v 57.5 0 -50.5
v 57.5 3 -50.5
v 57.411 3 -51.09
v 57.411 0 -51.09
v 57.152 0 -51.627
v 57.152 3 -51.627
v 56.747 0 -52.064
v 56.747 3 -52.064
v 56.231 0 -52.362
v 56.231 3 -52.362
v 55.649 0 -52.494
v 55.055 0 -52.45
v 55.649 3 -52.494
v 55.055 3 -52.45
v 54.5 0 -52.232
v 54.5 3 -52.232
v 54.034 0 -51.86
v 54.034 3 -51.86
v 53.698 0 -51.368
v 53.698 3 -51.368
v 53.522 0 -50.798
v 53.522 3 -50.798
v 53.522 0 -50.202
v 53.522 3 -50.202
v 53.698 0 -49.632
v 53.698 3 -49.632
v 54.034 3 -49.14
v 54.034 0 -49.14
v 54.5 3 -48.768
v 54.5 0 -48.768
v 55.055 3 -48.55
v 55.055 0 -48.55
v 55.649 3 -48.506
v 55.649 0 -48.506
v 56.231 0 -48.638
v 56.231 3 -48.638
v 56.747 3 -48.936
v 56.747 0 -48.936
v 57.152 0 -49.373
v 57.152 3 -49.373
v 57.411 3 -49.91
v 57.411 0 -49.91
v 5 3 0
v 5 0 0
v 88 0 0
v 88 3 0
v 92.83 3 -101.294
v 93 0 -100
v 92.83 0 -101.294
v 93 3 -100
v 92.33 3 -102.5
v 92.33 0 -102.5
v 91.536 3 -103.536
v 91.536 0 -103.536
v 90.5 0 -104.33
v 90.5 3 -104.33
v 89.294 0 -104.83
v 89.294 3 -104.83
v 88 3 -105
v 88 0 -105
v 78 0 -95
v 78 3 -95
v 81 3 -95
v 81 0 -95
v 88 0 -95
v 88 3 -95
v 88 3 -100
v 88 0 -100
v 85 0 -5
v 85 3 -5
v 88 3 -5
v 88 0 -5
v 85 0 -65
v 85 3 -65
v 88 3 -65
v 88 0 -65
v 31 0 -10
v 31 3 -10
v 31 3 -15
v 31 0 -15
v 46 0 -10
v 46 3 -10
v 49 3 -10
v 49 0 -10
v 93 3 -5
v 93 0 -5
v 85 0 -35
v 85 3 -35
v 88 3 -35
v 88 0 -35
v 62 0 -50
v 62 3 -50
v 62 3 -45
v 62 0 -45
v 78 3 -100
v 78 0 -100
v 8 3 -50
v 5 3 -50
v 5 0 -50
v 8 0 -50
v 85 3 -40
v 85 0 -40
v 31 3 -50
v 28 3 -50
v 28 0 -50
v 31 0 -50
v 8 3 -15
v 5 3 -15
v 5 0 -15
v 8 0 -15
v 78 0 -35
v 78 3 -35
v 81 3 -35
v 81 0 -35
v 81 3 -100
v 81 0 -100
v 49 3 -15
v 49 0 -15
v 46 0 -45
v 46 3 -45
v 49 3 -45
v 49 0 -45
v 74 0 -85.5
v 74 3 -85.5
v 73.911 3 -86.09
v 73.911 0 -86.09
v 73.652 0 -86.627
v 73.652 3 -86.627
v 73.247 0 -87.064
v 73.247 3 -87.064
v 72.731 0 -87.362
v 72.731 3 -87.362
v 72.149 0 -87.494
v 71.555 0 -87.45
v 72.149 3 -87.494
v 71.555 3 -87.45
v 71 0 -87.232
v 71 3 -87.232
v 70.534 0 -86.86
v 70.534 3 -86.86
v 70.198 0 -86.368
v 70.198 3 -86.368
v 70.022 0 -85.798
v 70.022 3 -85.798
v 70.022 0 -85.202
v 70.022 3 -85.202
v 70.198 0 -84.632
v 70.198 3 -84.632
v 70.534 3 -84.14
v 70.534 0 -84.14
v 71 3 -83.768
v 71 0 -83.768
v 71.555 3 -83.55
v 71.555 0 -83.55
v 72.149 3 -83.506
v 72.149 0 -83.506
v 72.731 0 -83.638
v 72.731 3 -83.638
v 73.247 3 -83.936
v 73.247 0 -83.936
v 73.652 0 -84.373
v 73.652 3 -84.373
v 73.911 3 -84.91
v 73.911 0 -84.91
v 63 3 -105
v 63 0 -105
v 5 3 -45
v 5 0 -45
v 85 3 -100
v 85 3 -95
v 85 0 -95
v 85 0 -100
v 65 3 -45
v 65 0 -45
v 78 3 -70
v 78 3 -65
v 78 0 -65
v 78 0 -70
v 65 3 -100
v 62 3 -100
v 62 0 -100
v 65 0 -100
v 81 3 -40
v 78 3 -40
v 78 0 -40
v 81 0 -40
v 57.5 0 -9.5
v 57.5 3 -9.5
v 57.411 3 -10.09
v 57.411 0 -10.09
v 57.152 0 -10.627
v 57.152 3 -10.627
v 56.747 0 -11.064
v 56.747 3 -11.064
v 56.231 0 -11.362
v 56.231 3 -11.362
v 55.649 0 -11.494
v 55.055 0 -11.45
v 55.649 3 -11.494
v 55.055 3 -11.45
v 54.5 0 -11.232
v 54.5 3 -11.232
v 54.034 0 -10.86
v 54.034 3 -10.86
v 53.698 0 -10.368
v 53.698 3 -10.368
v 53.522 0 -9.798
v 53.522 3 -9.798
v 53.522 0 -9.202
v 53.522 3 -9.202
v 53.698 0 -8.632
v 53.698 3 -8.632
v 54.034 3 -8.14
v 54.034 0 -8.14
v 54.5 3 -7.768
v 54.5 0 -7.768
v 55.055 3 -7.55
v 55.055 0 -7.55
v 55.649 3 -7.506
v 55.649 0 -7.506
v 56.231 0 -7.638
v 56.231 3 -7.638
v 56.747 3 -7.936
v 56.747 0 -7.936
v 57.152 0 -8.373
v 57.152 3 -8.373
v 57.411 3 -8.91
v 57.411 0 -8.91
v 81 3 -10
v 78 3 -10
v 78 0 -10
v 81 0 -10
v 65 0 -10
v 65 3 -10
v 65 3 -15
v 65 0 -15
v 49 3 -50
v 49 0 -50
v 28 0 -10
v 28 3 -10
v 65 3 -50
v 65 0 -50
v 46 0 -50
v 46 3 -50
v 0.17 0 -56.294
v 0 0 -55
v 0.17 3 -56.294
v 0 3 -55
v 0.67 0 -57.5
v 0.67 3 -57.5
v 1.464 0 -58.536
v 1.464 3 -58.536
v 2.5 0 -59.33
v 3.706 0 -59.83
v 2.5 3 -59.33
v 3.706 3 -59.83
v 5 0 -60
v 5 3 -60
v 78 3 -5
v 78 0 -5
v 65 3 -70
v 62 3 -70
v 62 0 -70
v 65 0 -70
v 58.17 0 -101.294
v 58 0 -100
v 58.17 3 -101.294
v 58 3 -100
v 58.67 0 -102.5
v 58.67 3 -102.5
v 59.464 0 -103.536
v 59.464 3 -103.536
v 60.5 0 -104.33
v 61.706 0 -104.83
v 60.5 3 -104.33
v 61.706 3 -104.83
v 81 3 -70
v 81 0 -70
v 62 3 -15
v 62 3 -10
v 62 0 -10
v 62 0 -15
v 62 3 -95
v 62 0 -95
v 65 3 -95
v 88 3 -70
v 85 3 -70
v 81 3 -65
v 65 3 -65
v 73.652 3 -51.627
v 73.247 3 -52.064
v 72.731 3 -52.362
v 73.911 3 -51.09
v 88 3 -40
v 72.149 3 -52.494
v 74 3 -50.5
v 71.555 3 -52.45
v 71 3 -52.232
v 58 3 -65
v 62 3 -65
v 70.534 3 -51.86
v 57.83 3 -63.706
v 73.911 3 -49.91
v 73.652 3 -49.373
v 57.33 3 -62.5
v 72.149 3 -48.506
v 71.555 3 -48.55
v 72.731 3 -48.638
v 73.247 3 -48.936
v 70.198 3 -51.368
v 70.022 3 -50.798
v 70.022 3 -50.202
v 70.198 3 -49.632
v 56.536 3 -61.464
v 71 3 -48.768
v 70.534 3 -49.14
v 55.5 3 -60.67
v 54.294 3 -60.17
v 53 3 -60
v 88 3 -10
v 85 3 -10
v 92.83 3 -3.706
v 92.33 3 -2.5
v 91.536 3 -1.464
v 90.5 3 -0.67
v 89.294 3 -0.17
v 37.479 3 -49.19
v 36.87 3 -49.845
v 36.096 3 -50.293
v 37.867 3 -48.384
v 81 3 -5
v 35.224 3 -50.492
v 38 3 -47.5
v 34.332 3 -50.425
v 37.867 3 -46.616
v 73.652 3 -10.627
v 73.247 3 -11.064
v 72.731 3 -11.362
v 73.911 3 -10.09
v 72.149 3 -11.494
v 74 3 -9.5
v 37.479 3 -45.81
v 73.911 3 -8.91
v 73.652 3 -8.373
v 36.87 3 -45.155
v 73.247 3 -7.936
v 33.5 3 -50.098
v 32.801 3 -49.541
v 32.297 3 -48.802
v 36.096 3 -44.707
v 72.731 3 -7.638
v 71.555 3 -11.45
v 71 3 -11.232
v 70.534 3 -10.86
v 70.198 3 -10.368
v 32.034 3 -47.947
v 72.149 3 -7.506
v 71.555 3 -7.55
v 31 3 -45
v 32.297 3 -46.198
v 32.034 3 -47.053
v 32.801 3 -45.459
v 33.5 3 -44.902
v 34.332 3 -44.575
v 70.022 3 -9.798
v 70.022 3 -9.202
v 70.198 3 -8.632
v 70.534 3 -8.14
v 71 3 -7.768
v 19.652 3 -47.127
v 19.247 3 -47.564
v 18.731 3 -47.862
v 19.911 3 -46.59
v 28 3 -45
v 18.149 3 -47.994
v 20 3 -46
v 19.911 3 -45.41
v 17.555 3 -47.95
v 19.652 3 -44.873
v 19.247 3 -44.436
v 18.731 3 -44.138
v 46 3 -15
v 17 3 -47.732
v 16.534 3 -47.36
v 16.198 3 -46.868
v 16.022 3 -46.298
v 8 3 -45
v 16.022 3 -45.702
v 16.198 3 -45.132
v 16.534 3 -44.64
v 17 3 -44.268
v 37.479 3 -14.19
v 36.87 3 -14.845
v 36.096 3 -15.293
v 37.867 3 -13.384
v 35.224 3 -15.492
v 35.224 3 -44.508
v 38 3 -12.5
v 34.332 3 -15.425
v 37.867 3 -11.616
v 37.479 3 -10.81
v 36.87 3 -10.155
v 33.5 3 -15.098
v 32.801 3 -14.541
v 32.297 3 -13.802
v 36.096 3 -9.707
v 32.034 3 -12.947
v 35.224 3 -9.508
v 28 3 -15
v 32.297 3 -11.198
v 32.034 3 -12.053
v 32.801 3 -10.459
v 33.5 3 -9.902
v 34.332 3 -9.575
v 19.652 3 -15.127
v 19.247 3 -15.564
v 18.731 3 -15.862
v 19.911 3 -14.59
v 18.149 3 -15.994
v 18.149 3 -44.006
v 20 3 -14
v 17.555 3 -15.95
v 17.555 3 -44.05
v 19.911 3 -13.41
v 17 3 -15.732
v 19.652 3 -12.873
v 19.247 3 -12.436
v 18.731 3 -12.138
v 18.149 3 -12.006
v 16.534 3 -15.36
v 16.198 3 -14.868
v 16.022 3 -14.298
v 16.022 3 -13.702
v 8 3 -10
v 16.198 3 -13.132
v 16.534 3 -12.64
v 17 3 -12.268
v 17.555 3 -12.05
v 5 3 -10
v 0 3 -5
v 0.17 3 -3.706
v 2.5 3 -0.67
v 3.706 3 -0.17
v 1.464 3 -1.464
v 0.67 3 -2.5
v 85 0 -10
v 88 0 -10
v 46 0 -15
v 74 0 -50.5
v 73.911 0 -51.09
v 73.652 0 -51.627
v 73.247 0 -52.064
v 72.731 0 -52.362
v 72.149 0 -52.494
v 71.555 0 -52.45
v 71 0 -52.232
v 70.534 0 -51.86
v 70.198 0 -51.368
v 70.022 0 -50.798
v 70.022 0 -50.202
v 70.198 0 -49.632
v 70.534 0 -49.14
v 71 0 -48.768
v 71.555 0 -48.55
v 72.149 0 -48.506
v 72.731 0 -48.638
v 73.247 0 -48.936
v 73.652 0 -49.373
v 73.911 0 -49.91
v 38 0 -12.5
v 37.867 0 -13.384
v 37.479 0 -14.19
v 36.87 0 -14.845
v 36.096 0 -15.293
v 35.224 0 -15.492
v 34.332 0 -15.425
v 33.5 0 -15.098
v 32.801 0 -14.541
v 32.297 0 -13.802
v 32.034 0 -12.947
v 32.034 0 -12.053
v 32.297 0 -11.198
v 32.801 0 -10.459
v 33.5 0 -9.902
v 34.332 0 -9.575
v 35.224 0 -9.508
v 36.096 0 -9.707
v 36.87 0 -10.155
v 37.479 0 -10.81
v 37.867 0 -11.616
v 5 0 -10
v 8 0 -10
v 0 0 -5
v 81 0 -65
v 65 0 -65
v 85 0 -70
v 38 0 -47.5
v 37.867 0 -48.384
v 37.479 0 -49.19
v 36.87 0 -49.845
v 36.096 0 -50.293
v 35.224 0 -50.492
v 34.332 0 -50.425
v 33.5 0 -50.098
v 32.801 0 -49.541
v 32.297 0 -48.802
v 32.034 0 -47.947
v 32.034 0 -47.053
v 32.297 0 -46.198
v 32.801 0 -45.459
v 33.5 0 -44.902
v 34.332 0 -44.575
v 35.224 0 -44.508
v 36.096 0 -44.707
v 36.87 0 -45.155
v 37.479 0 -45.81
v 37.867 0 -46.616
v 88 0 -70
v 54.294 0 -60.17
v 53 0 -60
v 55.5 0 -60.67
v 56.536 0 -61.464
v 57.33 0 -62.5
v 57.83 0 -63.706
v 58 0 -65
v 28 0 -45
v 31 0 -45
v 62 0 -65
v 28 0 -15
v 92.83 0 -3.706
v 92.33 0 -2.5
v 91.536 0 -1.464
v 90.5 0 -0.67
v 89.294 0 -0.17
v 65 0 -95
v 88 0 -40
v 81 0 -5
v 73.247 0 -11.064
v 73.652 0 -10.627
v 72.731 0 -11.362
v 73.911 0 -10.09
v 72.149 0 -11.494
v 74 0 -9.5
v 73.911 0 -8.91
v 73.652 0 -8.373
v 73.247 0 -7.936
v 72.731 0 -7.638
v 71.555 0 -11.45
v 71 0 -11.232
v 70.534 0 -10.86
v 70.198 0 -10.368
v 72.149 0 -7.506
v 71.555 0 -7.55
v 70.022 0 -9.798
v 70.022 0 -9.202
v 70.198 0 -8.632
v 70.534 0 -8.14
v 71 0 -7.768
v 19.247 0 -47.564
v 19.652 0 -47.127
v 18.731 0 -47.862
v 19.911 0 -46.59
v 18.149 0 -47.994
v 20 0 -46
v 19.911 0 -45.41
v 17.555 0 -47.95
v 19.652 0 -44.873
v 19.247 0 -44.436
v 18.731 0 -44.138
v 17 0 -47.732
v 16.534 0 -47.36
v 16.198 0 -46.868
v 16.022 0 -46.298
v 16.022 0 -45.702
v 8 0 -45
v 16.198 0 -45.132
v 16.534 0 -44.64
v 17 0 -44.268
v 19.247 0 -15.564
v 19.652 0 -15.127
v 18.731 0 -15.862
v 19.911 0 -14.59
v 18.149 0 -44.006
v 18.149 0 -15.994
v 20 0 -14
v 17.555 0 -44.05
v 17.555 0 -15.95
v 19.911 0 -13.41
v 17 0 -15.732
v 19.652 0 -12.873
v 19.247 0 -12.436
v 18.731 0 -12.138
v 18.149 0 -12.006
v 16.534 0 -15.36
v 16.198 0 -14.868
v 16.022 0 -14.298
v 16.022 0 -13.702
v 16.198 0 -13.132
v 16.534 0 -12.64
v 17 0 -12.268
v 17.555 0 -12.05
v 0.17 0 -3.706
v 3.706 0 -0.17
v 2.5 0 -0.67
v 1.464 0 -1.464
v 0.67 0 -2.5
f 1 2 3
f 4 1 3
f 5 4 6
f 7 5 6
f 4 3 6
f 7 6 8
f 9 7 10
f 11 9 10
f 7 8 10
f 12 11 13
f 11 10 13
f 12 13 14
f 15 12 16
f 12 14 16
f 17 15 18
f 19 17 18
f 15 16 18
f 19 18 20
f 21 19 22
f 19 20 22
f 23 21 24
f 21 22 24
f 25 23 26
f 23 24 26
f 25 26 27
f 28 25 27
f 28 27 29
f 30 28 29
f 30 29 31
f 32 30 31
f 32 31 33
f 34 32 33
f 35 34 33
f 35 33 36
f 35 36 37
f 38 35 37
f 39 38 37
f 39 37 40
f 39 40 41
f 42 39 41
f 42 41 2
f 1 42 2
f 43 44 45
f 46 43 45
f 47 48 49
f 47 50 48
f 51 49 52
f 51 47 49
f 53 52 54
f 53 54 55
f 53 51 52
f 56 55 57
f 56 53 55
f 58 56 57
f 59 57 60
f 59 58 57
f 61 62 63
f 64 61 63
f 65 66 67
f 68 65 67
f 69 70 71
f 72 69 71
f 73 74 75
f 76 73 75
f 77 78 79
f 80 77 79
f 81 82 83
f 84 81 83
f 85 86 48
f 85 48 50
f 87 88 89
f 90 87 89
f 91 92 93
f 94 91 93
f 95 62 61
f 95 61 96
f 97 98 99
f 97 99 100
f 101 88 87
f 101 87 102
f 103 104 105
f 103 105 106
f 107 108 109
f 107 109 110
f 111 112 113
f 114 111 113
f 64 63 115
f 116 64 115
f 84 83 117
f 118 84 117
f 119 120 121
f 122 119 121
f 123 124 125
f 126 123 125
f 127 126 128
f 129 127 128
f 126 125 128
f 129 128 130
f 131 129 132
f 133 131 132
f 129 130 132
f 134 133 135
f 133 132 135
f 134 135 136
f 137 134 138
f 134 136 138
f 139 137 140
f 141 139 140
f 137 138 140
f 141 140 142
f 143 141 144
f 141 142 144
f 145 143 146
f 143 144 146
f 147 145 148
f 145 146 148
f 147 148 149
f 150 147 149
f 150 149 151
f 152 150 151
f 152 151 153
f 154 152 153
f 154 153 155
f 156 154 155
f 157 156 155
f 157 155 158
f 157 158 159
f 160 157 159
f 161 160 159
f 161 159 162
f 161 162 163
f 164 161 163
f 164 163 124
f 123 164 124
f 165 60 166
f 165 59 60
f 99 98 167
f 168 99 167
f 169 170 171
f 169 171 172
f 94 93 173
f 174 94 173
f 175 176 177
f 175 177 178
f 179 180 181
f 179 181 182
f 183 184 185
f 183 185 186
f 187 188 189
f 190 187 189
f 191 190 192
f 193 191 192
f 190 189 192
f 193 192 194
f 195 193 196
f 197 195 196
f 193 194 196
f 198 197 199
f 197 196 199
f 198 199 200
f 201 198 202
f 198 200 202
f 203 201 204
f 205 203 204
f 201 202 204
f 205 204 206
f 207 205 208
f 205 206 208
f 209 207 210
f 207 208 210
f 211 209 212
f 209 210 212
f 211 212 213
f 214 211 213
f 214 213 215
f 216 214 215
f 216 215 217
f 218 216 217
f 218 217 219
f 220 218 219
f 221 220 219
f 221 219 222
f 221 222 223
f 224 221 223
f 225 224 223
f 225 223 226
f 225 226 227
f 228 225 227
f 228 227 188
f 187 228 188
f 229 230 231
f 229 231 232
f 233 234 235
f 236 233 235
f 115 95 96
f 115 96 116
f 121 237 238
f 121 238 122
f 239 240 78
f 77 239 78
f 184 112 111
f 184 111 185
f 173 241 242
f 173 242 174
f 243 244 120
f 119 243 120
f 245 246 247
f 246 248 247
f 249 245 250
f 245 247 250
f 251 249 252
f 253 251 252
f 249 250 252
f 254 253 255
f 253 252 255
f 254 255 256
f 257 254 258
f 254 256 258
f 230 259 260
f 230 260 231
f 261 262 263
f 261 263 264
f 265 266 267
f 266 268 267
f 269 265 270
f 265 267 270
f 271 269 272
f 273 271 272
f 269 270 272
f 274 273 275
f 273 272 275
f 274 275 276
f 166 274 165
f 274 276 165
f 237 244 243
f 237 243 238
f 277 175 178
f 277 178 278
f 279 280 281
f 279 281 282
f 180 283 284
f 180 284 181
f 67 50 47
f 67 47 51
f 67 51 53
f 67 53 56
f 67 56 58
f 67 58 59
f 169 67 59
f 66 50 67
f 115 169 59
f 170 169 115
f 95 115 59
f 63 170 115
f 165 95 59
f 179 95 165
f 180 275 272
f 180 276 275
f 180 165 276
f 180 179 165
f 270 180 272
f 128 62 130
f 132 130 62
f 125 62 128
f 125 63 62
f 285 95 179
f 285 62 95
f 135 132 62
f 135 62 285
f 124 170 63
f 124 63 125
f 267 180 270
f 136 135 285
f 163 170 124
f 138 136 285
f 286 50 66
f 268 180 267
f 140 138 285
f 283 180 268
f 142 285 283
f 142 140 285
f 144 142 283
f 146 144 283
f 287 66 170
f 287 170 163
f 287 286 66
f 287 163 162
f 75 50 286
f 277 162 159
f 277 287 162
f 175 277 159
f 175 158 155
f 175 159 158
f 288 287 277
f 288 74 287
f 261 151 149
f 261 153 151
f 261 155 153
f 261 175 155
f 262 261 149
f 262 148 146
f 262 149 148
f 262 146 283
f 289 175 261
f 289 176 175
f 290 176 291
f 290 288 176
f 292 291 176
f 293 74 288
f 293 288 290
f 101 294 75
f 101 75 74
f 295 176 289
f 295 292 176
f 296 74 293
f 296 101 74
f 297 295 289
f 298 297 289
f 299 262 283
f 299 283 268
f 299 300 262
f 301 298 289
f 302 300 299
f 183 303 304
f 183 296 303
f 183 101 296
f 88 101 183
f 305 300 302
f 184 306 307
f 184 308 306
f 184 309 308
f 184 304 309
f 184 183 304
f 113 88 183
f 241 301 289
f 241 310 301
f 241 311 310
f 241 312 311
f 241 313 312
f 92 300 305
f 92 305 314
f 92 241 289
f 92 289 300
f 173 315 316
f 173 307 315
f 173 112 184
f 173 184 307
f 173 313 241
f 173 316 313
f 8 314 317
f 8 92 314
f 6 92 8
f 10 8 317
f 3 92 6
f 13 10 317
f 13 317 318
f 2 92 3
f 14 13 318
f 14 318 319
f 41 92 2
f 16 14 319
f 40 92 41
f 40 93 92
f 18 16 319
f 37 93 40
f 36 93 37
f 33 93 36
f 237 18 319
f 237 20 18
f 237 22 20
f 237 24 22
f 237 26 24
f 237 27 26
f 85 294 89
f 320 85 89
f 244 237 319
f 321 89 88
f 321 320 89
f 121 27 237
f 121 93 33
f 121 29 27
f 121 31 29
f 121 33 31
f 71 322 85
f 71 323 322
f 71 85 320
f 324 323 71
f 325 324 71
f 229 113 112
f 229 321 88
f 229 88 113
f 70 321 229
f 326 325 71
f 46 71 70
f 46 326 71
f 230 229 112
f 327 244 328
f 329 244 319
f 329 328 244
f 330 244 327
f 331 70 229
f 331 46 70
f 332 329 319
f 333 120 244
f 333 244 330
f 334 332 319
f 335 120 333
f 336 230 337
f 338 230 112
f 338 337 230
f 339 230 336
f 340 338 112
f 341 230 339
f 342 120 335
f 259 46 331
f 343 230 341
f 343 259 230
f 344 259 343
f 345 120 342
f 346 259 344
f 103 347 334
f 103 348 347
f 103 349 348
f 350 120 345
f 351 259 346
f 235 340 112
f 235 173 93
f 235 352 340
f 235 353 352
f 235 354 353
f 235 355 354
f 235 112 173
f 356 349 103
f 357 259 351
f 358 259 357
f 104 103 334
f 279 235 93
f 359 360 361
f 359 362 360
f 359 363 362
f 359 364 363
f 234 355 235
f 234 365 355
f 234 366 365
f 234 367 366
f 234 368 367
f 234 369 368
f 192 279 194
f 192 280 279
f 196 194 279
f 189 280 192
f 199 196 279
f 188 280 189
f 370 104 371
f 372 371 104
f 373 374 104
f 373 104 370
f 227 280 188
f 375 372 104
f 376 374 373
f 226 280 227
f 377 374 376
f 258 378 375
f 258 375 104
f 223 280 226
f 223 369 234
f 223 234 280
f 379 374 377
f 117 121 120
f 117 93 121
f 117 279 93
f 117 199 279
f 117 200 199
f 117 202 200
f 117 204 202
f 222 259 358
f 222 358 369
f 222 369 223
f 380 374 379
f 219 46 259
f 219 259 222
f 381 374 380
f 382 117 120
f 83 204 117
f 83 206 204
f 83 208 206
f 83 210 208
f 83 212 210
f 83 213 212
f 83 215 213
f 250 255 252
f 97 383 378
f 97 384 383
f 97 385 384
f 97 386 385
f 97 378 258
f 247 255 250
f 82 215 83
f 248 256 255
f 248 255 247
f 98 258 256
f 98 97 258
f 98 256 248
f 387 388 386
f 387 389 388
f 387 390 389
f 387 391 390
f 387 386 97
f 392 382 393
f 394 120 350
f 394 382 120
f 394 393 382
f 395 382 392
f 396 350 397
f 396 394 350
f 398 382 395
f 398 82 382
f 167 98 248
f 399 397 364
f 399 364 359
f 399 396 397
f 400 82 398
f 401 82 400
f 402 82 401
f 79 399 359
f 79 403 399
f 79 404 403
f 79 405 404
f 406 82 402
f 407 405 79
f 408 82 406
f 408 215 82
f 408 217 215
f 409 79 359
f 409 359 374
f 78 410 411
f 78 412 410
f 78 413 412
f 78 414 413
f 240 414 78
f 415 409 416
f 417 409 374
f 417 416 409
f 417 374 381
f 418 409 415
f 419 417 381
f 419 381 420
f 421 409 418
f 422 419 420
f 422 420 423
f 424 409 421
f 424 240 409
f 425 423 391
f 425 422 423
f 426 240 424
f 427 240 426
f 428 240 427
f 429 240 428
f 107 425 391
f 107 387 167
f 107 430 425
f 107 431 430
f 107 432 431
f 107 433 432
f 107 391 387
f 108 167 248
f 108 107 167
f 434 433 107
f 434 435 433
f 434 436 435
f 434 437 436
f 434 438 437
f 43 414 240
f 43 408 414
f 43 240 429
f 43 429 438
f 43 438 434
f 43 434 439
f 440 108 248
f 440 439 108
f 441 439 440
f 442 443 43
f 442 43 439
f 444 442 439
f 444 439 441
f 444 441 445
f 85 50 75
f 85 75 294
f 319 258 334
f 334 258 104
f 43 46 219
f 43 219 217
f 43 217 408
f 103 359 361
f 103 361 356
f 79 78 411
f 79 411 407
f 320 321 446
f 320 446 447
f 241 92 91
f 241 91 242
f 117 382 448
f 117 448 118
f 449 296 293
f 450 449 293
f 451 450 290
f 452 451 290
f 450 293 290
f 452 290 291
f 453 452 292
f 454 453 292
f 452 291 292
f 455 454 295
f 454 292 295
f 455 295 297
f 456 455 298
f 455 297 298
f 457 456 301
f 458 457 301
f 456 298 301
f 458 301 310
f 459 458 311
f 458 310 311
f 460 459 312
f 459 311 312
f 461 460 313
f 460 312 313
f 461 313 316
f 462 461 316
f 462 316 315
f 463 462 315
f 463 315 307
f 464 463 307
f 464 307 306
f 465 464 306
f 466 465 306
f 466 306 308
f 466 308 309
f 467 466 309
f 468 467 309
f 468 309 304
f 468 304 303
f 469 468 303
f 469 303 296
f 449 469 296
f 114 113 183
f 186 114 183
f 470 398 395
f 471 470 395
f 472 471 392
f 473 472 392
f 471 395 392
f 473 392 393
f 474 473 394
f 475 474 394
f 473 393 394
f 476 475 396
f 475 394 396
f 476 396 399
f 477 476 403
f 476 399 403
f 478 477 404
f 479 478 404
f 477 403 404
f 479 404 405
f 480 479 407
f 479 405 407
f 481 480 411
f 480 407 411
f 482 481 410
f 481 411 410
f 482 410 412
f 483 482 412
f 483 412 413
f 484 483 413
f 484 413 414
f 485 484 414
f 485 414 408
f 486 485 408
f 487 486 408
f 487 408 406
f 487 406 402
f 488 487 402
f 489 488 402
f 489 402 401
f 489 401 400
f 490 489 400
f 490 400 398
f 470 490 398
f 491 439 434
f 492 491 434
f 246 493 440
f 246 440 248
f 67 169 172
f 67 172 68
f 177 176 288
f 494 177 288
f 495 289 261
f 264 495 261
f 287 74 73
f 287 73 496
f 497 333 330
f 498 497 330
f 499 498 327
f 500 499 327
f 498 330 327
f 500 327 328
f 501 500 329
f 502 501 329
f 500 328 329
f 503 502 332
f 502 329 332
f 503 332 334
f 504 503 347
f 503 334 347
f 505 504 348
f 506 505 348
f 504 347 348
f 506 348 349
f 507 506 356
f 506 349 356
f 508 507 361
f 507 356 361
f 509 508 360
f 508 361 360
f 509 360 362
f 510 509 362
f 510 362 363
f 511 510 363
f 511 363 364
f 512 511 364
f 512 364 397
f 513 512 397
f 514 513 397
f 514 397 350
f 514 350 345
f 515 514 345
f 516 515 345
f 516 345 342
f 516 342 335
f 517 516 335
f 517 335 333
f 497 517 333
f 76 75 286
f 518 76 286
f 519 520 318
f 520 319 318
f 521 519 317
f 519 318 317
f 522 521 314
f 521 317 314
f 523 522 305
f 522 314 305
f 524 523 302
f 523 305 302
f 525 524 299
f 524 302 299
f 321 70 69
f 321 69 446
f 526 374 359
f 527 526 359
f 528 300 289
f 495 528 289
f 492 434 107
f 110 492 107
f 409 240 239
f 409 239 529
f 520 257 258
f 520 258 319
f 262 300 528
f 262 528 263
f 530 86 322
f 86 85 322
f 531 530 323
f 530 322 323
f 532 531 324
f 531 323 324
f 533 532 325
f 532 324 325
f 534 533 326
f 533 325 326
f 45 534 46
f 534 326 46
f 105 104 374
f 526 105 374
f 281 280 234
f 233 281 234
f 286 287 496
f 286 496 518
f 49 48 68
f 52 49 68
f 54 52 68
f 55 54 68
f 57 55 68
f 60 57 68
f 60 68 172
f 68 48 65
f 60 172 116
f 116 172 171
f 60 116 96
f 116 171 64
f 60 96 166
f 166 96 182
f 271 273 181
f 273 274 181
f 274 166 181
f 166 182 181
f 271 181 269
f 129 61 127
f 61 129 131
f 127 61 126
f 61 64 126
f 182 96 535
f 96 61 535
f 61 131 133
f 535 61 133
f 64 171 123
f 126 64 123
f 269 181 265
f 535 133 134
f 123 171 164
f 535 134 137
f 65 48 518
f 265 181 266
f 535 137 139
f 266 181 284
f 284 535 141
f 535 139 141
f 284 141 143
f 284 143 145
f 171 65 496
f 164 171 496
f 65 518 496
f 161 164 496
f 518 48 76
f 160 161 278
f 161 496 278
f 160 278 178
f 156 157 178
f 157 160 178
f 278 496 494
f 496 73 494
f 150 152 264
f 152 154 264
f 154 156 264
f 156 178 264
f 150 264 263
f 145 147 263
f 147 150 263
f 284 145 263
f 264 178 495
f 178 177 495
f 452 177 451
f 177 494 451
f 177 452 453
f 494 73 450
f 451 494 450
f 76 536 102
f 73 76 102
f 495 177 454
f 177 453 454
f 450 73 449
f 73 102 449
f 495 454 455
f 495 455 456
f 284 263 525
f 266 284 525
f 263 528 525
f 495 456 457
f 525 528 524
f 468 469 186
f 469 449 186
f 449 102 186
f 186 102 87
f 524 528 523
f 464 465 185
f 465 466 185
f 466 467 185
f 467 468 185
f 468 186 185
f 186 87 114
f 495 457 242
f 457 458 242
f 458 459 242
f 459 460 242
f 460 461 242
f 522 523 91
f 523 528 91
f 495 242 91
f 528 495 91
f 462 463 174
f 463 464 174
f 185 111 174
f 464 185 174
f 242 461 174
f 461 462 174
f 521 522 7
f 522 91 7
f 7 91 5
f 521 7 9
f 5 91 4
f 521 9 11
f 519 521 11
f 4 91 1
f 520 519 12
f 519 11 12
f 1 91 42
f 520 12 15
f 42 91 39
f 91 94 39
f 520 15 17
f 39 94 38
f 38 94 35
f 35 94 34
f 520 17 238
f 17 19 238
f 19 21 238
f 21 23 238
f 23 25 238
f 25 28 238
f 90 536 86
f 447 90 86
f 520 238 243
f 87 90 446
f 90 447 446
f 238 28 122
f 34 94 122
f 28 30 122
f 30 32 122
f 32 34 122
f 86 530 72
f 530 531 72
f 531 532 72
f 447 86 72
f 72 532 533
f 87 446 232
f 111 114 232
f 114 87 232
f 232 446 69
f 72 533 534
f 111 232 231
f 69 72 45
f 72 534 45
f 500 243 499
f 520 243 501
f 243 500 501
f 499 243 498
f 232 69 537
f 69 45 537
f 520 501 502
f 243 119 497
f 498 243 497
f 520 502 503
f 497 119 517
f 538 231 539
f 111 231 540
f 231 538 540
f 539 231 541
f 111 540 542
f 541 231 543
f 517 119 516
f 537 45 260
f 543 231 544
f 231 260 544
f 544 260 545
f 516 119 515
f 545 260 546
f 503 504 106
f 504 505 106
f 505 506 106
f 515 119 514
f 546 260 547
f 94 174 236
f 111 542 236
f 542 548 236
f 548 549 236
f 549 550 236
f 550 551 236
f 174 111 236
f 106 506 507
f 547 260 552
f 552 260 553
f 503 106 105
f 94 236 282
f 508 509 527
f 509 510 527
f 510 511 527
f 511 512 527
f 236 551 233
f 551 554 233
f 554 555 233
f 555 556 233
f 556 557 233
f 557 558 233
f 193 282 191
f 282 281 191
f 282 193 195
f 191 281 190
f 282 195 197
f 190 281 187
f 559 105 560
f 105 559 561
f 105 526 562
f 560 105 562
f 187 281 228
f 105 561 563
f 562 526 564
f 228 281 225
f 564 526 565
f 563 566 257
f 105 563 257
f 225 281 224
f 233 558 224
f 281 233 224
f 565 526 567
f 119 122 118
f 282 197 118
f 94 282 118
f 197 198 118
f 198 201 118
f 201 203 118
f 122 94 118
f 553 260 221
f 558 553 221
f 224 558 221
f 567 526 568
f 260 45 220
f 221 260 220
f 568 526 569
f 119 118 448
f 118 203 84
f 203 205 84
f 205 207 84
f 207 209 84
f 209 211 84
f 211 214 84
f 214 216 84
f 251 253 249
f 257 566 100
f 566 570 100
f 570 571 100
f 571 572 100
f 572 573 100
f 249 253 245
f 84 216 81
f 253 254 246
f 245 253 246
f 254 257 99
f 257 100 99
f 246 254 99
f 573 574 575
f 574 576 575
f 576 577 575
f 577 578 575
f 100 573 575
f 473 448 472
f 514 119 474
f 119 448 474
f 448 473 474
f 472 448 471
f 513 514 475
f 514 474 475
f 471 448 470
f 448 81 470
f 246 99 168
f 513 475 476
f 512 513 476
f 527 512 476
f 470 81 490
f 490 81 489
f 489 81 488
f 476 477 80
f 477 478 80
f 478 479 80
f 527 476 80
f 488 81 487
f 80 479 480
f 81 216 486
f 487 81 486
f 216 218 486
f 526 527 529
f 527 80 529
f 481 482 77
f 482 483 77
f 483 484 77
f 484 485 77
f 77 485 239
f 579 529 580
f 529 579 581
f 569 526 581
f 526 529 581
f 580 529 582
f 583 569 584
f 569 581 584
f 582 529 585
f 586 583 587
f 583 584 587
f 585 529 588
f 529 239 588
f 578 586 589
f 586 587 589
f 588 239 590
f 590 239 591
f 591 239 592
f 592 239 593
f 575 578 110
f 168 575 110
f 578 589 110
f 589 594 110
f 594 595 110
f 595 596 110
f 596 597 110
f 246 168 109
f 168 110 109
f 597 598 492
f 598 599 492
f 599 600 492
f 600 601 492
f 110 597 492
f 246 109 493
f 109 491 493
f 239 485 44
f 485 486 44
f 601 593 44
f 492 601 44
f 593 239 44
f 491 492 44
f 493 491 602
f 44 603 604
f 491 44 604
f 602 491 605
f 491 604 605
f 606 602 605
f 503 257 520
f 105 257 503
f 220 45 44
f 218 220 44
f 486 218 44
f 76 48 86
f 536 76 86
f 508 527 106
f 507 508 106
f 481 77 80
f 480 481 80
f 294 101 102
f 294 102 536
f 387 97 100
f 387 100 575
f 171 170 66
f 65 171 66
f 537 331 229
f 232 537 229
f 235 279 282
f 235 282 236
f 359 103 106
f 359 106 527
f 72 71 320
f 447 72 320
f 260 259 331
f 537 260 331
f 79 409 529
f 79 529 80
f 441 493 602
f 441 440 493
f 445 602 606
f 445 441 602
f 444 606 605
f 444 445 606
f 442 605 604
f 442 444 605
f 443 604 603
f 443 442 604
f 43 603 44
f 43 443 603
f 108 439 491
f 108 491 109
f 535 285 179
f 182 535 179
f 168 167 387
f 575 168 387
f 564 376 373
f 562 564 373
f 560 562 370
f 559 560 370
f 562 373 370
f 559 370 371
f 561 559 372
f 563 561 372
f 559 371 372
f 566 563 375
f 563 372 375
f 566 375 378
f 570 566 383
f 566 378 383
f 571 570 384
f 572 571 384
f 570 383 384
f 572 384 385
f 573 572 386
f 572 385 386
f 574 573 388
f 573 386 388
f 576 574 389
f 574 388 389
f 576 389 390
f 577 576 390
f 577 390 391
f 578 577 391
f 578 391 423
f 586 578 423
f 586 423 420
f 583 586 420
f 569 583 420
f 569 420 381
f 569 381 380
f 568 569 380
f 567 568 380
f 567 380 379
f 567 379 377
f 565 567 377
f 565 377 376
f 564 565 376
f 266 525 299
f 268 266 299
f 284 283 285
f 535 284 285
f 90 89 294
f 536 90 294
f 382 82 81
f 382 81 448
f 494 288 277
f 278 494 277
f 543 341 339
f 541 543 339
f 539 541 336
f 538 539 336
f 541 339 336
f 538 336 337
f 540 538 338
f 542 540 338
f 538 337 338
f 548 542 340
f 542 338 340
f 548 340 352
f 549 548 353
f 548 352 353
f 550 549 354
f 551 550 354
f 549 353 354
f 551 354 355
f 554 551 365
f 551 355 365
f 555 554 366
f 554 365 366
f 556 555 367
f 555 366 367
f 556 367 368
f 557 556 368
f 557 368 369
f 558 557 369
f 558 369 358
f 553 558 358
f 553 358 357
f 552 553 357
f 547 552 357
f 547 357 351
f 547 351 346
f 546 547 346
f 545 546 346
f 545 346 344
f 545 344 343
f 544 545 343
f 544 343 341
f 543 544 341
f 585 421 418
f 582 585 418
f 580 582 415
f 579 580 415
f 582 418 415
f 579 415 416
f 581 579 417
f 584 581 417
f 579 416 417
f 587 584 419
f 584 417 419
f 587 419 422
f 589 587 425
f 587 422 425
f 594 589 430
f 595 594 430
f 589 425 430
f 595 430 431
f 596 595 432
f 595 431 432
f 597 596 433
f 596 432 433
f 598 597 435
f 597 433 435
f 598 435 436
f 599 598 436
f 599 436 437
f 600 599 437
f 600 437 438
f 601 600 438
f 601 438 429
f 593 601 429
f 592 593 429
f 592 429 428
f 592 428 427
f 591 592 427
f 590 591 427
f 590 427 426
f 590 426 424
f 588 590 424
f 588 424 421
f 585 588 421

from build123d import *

# Parameters (mm, degrees)
SKETCH1_W            = 93
SKETCH1_H            = 60
BOSS_EXTRUDE1_DEPTH  = 3
SKETCH2_W            = 3
SKETCH2_H            = 5
CUT_EXTRUDE1_DEPTH   = 3
SKETCH4_W            = 35
SKETCH4_H            = 3
BOSS_EXTRUDE2_DEPTH  = 45
FILLET1_R            = 5
SKETCH5_W            = 3
SKETCH5_H            = 5
CUT_EXTRUDE3_DEPTH   = 4
LPATTERN1_COUNT      = 4
LPATTERN1_PITCH      = 30
LPATTERN1_COUNT_DIR2 = 2
LPATTERN1_PITCH_DIR2 = 30
SKETCH6_R            = 2
CUT_EXTRUDE4_DEPTH   = 4
SKETCH7_W            = 3
SKETCH7_H            = 5
CUT_EXTRUDE5_DEPTH   = 4
SKETCH8_R            = 3
CUT_EXTRUDE6_DEPTH   = 4


with BuildPart() as part:
    # Sketch1 → Boss-Extrude1 (new body)
    with BuildSketch(Plane(origin=(0, 0, 0), x_dir=(1, 0, 0), z_dir=(0, 1, 0))):
        with Locations((46.5, 30)):
            Rectangle(SKETCH1_W, SKETCH1_H)
    extrude(amount=BOSS_EXTRUDE1_DEPTH)

    # Sketch2 → Cut-Extrude1 (cut)
    with BuildSketch(Plane(origin=(0, 3, 0), x_dir=(1, 0, 0), z_dir=(0, 1, 0))):
        with Locations((63.5, 12.5)):
            Rectangle(SKETCH2_W, SKETCH2_H)
        with Locations((47.5, 12.5)):
            Rectangle(SKETCH2_W, SKETCH2_H)
        with Locations((29.5, 12.5)):
            Rectangle(SKETCH2_W, SKETCH2_H)
        with Locations((6.5, 12.5)):
            Rectangle(SKETCH2_W, SKETCH2_H)
    cut_extrude1 = extrude(amount=-CUT_EXTRUDE1_DEPTH, mode=Mode.SUBTRACT)

    # Mirror1: Cut-Extrude1 across plane
    add(cut_extrude1.mirror(Plane.XY.offset(-30)), mode=Mode.SUBTRACT)

    # Sketch4 → Boss-Extrude2 (add)
    with BuildSketch(Plane(origin=(0, 0, -60), x_dir=(-1, 0, 0), z_dir=(0, 0, -1))):
        with Locations((-75.5, 1.5)):
            Rectangle(SKETCH4_W, SKETCH4_H)
    extrude(amount=BOSS_EXTRUDE2_DEPTH)

    # Fillet1
    fillet1_edges = [part.edges().sort_by_distance(p)[0] for p in [
        (58, 1.5, -60),
        (93, 1.5, -105),
        (58, 1.5, -105),
        (0, 1.5, -60),
        (93, 1.5, 0),
        (0, 1.5, 0),
    ]]
    fillet(fillet1_edges, radius=FILLET1_R)

    # Sketch5 → Cut-Extrude3 (cut, through all)
    with BuildSketch(Plane(origin=(0, 3, 0), x_dir=(1, 0, 0), z_dir=(0, 1, 0))):
        with Locations((86.5, 7.5)):
            Rectangle(SKETCH5_W, SKETCH5_H)
        with Locations((79.5, 7.5)):
            Rectangle(SKETCH5_W, SKETCH5_H)
    cut_extrude3 = extrude(amount=-CUT_EXTRUDE3_DEPTH, mode=Mode.SUBTRACT)

    # LPattern1: Cut-Extrude3 4 × 2
    with Locations(*[(j * LPATTERN1_PITCH_DIR2, 0, -i * LPATTERN1_PITCH) for i in range(LPATTERN1_COUNT) for j in range(LPATTERN1_COUNT_DIR2) if (i, j) != (0, 0)]):
        add(cut_extrude3, mode=Mode.SUBTRACT)

    # Sketch6 → Cut-Extrude4 (cut, through all)
    with BuildSketch(Plane(origin=(0, 3, 0), x_dir=(1, 0, 0), z_dir=(0, 1, 0))):
        with Locations((18, 14)):
            Circle(SKETCH6_R)
        with Locations((18, 46)):
            Circle(SKETCH6_R)
        with Locations((55.5, 50.5)):
            Circle(SKETCH6_R)
        with Locations((55.5, 9.5)):
            Circle(SKETCH6_R)
        with Locations((72, 9.5)):
            Circle(SKETCH6_R)
        with Locations((72, 50.5)):
            Circle(SKETCH6_R)
        with Locations((72, 85.5)):
            Circle(SKETCH6_R)
    extrude(amount=-CUT_EXTRUDE4_DEPTH, mode=Mode.SUBTRACT)

    # Sketch7 → Cut-Extrude5 (cut, through all)
    with BuildSketch(Plane(origin=(0, 3, 0), x_dir=(1, 0, 0), z_dir=(0, 1, 0))):
        with Locations((63.5, 67.5)):
            Rectangle(SKETCH7_W, SKETCH7_H)
        with Locations((63.5, 97.5)):
            Rectangle(SKETCH7_W, SKETCH7_H)
    extrude(amount=-CUT_EXTRUDE5_DEPTH, mode=Mode.SUBTRACT)

    # Sketch8 → Cut-Extrude6 (cut, through all)
    with BuildSketch(Plane(origin=(0, 3, 0), x_dir=(1, 0, 0), z_dir=(0, 1, 0))):
        with Locations((35, 12.5)):
            Circle(SKETCH8_R)
        with Locations((35, 47.5)):
            Circle(SKETCH8_R)
    extrude(amount=-CUT_EXTRUDE6_DEPTH, mode=Mode.SUBTRACT)


solid = part.part
